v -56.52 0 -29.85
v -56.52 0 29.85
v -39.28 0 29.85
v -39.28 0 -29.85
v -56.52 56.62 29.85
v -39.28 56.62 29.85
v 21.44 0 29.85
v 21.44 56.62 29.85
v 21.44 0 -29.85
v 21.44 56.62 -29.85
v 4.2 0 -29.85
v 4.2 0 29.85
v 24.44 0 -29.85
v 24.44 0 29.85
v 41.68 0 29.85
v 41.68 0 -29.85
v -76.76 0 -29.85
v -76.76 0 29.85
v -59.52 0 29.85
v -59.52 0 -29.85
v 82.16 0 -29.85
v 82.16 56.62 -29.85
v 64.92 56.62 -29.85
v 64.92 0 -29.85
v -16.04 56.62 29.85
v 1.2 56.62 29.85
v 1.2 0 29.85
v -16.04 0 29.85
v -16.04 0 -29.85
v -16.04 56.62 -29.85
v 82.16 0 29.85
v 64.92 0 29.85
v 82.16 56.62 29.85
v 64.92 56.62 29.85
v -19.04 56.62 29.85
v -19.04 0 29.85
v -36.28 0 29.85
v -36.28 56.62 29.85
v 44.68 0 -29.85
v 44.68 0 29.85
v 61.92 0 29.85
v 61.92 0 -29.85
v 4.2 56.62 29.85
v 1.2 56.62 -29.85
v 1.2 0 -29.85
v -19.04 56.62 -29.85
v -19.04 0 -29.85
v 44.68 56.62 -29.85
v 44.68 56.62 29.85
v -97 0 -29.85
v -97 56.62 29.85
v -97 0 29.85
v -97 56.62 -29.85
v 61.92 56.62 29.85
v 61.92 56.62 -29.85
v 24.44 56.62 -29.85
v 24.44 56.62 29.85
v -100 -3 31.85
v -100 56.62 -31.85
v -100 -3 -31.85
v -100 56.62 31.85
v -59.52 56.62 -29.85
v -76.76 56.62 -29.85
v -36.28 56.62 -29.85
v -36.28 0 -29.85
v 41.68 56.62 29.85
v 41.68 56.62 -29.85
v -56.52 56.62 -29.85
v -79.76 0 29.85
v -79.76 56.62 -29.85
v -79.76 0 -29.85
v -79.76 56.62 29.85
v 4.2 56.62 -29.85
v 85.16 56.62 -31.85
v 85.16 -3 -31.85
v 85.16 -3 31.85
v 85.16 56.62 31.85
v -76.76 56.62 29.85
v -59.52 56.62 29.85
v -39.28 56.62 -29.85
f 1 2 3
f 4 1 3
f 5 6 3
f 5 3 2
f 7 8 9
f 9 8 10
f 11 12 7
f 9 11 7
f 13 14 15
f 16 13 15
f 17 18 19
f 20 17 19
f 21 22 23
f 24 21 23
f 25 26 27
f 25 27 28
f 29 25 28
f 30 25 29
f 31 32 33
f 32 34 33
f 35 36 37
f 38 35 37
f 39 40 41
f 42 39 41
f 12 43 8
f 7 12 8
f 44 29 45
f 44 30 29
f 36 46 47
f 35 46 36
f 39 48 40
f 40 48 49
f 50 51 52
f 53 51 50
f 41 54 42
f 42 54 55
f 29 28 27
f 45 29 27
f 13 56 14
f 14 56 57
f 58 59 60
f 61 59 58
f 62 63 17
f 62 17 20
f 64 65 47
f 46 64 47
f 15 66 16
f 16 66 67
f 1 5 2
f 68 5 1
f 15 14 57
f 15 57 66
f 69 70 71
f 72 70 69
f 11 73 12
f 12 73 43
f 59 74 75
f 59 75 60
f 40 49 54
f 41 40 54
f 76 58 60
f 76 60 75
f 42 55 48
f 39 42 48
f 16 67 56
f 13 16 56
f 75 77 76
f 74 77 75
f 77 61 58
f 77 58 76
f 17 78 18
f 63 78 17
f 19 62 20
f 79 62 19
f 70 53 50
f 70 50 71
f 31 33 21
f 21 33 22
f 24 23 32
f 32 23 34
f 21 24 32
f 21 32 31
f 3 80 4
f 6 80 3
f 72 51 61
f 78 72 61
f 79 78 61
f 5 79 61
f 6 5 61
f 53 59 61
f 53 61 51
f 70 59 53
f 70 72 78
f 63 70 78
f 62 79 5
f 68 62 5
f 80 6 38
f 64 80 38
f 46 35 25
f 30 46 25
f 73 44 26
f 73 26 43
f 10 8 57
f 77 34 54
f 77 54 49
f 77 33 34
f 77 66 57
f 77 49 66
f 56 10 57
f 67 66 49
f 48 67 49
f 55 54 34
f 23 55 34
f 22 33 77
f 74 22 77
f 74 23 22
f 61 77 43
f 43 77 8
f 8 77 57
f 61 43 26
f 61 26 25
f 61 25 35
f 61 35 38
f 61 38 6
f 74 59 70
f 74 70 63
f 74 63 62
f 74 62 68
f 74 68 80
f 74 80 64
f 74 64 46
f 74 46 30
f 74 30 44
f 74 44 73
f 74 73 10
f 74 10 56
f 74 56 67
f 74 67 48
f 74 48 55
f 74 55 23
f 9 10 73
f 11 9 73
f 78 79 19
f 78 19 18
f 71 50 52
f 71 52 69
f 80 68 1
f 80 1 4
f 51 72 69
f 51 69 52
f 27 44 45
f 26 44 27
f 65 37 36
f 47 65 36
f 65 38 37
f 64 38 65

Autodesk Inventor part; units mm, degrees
ref_plane "YZ Plane" through (0, 0, 0) normal (1, 0, 0) x (0, 1, 0)
ref_plane "XZ Plane" through (0, 0, 0) normal (0, 1, 0) x (-1, 0, 0)
ref_plane "XY Plane" through (0, 0, 0) normal (0, 0, 1) x (1, 0, 0)
sketch "Boceto1" plane through (0, 0, 0) normal (0, 1, 0) x (-1, 0, 0)
  line L0 (0, 0) -> (100, 0)
  line L1 (100, 0) -> (100, -31.85)
  line L2 (100, -31.85) -> (-100, -31.85)
  line L3 (-100, -31.85) -> (-100, 31.85)
  line L4 (-100, 31.85) -> (100, 31.85)
  line L5 (100, 31.85) -> (100, -31.85)
  dimension "d0" = 100
  dimension "d1" = 31.85
  dimension "d2" = 200
  dimension "d3" = 63.7
extrude "Extrusión1" add sketch "Boceto1" along normal blind 76.62
sketch "Boceto2" plane through (0, 76.62, 0) normal (0, 1, 0) x (1, 0, 0)
  line L0 (-100, 31.85) -> (-100, -31.85) projected
  line L1 (-100, 0) -> (-97, 0)
  line L2 (-97, 0) -> (-97, 29.85)
  line L3 (-97, 29.85) -> (-79.76, 29.85)
  line L4 (-97, 29.85) -> (-79.76, 29.85)
  line L5 (-79.76, 29.85) -> (-79.76, -29.85)
  line L6 (-79.76, -29.85) -> (-97, -29.85)
  line L7 (-97, -29.85) -> (-97, 29.85)
  line L8 (-79.76, 0) -> (-76.76, 0)
  line L9 (-76.76, 0) -> (-76.76, 29.85)
  line L10 (-76.76, 29.85) -> (-59.52, 29.85)
  line L11 (-59.52, 29.85) -> (-59.52, -29.85)
  line L12 (-59.52, -29.85) -> (-76.76, -29.85)
  line L13 (-76.76, -29.85) -> (-76.76, 29.85)
  line L14 (-59.52, 0) -> (-56.52, 0)
  line L15 (-56.52, 0) -> (-56.52, 29.85)
  line L16 (-56.52, 29.85) -> (-39.28, 29.85)
  line L17 (-39.28, 29.85) -> (-39.28, -29.85)
  line L18 (-39.28, -29.85) -> (-56.52, -29.85)
  line L19 (-56.52, -29.85) -> (-56.52, 29.85)
  line L20 (-39.28, 0) -> (-36.28, 0)
  line L21 (-36.28, 0) -> (-36.28, 29.85)
  line L22 (-36.28, 29.85) -> (-19.04, 29.85)
  line L23 (-19.04, 29.85) -> (-19.04, -29.85)
  line L24 (-19.04, -29.85) -> (-36.28, -29.85)
  line L25 (-36.28, -29.85) -> (-36.28, 29.85)
  line L26 (-19.04, 0) -> (-16.04, 0)
  line L27 (-16.04, 0) -> (-16.04, 29.85)
  line L28 (-16.04, 29.85) -> (1.2, 29.85)
  line L29 (1.2, 29.85) -> (1.2, -29.85)
  line L30 (1.2, -29.85) -> (-16.04, -29.85)
  line L31 (-16.04, -29.85) -> (-16.04, 29.85)
  line L32 (1.2, 0) -> (2.7, 0)
  line L33 (2.7, 0) -> (2.7, 9.0784)
  line L34 (82.16, 0) -> (82.16, 29.85)
  line L35 (82.16, 29.85) -> (64.92, 29.85)
  line L36 (64.92, 29.85) -> (64.92, -29.85)
  line L37 (64.92, -29.85) -> (82.16, -29.85)
  line L38 (82.16, -29.85) -> (82.16, 29.85)
  line L39 (64.92, 0) -> (61.92, 0)
  line L40 (61.92, 0) -> (61.92, 29.85)
  line L41 (61.92, 29.85) -> (44.68, 29.85)
  line L42 (44.68, 29.85) -> (44.68, -29.85)
  line L43 (44.68, -29.85) -> (61.92, -29.85)
  line L44 (61.92, -29.85) -> (61.92, 29.85)
  line L45 (44.68, 0) -> (41.68, 0)
  line L46 (41.68, 0) -> (41.68, 29.85)
  line L47 (41.68, 29.85) -> (24.44, 29.85)
  line L48 (24.44, 29.85) -> (24.44, -29.85)
  line L49 (24.44, -29.85) -> (41.68, -29.85)
  line L50 (41.68, -29.85) -> (41.68, 29.85)
  line L51 (24.44, 0) -> (21.44, 0)
  line L52 (21.44, 0) -> (21.44, 29.85)
  line L53 (21.44, 29.85) -> (4.2, 29.85)
  line L54 (4.2, 29.85) -> (4.2, -29.85)
  line L55 (4.2, -29.85) -> (21.44, -29.85)
  line L56 (21.44, -29.85) -> (21.44, 29.85)
  line L57 (82.16, 0) -> (85.16, 0)
  line L58 (85.16, 0) -> (85.16, 31.85)
  line L59 (100, -31.85) -> (100, 31.85) projected
  line L60 (85.16, 31.85) -> (100, 31.85)
  line L61 (100, 31.85) -> (100, -31.85)
  line L62 (100, -31.85) -> (85.16, -31.85)
  line L63 (85.16, -31.85) -> (85.16, 31.85)
  point P0 (0, 0)
  point P1 (5.4, 0)
  point P2 (4.2, 0)
  dimension "d6" = 3
  dimension "d7" = 29.85
  dimension "d8" = 17.24
  dimension "d9" = 17.24
  dimension "d10" = 59.7
  dimension "d11" = 3
  dimension "d12" = 17.24
  dimension "d13" = 59.7
  dimension "d14" = 3
  dimension "d15" = 17.24
  dimension "d16" = 59.7
  dimension "d17" = 3
  dimension "d18" = 17.24
  dimension "d19" = 59.7
  dimension "d20" = 3
  dimension "d21" = 17.24
  dimension "d22" = 59.7
  dimension "d23" = 1.5
  dimension "d24" = 3
extrude "Extrusión2" cut sketch "Boceto2" against normal blind 76.62
sketch "Boceto3" plane through (64.92, 76.62, 29.85) normal (1, 0, 0) x (0, 0, -1)
  line L0 (-2, 0) -> (61.7, 0) projected
  line L1 (-2, 0) -> (29.85, 0)
  line L2 (29.85, 0) -> (19.85, 0)
  point P0 (29.85, -76.62)
  dimension "d27" = 31.85
  dimension "d28" = 10
sketch "Boceto4" plane through (0, 0, 0) normal (0, -1, 0) x (1, 0, 0)
  line L0 (-100, -31.85) -> (-100, 31.85) projected
  line L1 (-100, 31.85) -> (85.16, 31.85)
  line L2 (85.16, 31.85) -> (85.16, -31.85)
  line L3 (85.16, -31.85) -> (-100, -31.85)
  line L4 (-100, -31.85) -> (-100, 31.85)
  point P0 (0, 0)
extrude "Extrusión3" add sketch "Boceto4" along normal blind 3
sketch "Boceto5" plane through (0, 76.62, 0) normal (0, 1, 0) x (1, 0, 0)
  line L0 (85.16, -31.85) -> (85.16, 31.85) projected
  line L1 (-100, -31.85) -> (85.16, -31.85)
  line L2 (85.16, -31.85) -> (85.16, 31.85)
  line L3 (85.16, 31.85) -> (-100, 31.85)
  line L4 (-100, 31.85) -> (-100, -31.85)
  point P0 (0, 0)
extrude "Extrusión4" cut sketch "Boceto5" against normal blind 20
sketch "Boceto6" plane through (85.16, -3, -31.85) normal (0, 0, -1) x (-1, 0, 0)
  point P0 (85.16, 3)
equation "\"d3\" = 2 * d1"
equation "\"d9\" = d8"
equation "\"d10\" = 2 * d7"
equation "\"d12\" = d8"
equation "\"d13\" = 2 * d7"
equation "\"d15\" = d8"
equation "\"d16\" = 2 * d7"
equation "\"d18\" = d8"
equation "\"d19\" = 2 * d7"
equation "\"d21\" = d8"
equation "\"d22\" = 2 * d7"
properties part number "Base_Principal"
